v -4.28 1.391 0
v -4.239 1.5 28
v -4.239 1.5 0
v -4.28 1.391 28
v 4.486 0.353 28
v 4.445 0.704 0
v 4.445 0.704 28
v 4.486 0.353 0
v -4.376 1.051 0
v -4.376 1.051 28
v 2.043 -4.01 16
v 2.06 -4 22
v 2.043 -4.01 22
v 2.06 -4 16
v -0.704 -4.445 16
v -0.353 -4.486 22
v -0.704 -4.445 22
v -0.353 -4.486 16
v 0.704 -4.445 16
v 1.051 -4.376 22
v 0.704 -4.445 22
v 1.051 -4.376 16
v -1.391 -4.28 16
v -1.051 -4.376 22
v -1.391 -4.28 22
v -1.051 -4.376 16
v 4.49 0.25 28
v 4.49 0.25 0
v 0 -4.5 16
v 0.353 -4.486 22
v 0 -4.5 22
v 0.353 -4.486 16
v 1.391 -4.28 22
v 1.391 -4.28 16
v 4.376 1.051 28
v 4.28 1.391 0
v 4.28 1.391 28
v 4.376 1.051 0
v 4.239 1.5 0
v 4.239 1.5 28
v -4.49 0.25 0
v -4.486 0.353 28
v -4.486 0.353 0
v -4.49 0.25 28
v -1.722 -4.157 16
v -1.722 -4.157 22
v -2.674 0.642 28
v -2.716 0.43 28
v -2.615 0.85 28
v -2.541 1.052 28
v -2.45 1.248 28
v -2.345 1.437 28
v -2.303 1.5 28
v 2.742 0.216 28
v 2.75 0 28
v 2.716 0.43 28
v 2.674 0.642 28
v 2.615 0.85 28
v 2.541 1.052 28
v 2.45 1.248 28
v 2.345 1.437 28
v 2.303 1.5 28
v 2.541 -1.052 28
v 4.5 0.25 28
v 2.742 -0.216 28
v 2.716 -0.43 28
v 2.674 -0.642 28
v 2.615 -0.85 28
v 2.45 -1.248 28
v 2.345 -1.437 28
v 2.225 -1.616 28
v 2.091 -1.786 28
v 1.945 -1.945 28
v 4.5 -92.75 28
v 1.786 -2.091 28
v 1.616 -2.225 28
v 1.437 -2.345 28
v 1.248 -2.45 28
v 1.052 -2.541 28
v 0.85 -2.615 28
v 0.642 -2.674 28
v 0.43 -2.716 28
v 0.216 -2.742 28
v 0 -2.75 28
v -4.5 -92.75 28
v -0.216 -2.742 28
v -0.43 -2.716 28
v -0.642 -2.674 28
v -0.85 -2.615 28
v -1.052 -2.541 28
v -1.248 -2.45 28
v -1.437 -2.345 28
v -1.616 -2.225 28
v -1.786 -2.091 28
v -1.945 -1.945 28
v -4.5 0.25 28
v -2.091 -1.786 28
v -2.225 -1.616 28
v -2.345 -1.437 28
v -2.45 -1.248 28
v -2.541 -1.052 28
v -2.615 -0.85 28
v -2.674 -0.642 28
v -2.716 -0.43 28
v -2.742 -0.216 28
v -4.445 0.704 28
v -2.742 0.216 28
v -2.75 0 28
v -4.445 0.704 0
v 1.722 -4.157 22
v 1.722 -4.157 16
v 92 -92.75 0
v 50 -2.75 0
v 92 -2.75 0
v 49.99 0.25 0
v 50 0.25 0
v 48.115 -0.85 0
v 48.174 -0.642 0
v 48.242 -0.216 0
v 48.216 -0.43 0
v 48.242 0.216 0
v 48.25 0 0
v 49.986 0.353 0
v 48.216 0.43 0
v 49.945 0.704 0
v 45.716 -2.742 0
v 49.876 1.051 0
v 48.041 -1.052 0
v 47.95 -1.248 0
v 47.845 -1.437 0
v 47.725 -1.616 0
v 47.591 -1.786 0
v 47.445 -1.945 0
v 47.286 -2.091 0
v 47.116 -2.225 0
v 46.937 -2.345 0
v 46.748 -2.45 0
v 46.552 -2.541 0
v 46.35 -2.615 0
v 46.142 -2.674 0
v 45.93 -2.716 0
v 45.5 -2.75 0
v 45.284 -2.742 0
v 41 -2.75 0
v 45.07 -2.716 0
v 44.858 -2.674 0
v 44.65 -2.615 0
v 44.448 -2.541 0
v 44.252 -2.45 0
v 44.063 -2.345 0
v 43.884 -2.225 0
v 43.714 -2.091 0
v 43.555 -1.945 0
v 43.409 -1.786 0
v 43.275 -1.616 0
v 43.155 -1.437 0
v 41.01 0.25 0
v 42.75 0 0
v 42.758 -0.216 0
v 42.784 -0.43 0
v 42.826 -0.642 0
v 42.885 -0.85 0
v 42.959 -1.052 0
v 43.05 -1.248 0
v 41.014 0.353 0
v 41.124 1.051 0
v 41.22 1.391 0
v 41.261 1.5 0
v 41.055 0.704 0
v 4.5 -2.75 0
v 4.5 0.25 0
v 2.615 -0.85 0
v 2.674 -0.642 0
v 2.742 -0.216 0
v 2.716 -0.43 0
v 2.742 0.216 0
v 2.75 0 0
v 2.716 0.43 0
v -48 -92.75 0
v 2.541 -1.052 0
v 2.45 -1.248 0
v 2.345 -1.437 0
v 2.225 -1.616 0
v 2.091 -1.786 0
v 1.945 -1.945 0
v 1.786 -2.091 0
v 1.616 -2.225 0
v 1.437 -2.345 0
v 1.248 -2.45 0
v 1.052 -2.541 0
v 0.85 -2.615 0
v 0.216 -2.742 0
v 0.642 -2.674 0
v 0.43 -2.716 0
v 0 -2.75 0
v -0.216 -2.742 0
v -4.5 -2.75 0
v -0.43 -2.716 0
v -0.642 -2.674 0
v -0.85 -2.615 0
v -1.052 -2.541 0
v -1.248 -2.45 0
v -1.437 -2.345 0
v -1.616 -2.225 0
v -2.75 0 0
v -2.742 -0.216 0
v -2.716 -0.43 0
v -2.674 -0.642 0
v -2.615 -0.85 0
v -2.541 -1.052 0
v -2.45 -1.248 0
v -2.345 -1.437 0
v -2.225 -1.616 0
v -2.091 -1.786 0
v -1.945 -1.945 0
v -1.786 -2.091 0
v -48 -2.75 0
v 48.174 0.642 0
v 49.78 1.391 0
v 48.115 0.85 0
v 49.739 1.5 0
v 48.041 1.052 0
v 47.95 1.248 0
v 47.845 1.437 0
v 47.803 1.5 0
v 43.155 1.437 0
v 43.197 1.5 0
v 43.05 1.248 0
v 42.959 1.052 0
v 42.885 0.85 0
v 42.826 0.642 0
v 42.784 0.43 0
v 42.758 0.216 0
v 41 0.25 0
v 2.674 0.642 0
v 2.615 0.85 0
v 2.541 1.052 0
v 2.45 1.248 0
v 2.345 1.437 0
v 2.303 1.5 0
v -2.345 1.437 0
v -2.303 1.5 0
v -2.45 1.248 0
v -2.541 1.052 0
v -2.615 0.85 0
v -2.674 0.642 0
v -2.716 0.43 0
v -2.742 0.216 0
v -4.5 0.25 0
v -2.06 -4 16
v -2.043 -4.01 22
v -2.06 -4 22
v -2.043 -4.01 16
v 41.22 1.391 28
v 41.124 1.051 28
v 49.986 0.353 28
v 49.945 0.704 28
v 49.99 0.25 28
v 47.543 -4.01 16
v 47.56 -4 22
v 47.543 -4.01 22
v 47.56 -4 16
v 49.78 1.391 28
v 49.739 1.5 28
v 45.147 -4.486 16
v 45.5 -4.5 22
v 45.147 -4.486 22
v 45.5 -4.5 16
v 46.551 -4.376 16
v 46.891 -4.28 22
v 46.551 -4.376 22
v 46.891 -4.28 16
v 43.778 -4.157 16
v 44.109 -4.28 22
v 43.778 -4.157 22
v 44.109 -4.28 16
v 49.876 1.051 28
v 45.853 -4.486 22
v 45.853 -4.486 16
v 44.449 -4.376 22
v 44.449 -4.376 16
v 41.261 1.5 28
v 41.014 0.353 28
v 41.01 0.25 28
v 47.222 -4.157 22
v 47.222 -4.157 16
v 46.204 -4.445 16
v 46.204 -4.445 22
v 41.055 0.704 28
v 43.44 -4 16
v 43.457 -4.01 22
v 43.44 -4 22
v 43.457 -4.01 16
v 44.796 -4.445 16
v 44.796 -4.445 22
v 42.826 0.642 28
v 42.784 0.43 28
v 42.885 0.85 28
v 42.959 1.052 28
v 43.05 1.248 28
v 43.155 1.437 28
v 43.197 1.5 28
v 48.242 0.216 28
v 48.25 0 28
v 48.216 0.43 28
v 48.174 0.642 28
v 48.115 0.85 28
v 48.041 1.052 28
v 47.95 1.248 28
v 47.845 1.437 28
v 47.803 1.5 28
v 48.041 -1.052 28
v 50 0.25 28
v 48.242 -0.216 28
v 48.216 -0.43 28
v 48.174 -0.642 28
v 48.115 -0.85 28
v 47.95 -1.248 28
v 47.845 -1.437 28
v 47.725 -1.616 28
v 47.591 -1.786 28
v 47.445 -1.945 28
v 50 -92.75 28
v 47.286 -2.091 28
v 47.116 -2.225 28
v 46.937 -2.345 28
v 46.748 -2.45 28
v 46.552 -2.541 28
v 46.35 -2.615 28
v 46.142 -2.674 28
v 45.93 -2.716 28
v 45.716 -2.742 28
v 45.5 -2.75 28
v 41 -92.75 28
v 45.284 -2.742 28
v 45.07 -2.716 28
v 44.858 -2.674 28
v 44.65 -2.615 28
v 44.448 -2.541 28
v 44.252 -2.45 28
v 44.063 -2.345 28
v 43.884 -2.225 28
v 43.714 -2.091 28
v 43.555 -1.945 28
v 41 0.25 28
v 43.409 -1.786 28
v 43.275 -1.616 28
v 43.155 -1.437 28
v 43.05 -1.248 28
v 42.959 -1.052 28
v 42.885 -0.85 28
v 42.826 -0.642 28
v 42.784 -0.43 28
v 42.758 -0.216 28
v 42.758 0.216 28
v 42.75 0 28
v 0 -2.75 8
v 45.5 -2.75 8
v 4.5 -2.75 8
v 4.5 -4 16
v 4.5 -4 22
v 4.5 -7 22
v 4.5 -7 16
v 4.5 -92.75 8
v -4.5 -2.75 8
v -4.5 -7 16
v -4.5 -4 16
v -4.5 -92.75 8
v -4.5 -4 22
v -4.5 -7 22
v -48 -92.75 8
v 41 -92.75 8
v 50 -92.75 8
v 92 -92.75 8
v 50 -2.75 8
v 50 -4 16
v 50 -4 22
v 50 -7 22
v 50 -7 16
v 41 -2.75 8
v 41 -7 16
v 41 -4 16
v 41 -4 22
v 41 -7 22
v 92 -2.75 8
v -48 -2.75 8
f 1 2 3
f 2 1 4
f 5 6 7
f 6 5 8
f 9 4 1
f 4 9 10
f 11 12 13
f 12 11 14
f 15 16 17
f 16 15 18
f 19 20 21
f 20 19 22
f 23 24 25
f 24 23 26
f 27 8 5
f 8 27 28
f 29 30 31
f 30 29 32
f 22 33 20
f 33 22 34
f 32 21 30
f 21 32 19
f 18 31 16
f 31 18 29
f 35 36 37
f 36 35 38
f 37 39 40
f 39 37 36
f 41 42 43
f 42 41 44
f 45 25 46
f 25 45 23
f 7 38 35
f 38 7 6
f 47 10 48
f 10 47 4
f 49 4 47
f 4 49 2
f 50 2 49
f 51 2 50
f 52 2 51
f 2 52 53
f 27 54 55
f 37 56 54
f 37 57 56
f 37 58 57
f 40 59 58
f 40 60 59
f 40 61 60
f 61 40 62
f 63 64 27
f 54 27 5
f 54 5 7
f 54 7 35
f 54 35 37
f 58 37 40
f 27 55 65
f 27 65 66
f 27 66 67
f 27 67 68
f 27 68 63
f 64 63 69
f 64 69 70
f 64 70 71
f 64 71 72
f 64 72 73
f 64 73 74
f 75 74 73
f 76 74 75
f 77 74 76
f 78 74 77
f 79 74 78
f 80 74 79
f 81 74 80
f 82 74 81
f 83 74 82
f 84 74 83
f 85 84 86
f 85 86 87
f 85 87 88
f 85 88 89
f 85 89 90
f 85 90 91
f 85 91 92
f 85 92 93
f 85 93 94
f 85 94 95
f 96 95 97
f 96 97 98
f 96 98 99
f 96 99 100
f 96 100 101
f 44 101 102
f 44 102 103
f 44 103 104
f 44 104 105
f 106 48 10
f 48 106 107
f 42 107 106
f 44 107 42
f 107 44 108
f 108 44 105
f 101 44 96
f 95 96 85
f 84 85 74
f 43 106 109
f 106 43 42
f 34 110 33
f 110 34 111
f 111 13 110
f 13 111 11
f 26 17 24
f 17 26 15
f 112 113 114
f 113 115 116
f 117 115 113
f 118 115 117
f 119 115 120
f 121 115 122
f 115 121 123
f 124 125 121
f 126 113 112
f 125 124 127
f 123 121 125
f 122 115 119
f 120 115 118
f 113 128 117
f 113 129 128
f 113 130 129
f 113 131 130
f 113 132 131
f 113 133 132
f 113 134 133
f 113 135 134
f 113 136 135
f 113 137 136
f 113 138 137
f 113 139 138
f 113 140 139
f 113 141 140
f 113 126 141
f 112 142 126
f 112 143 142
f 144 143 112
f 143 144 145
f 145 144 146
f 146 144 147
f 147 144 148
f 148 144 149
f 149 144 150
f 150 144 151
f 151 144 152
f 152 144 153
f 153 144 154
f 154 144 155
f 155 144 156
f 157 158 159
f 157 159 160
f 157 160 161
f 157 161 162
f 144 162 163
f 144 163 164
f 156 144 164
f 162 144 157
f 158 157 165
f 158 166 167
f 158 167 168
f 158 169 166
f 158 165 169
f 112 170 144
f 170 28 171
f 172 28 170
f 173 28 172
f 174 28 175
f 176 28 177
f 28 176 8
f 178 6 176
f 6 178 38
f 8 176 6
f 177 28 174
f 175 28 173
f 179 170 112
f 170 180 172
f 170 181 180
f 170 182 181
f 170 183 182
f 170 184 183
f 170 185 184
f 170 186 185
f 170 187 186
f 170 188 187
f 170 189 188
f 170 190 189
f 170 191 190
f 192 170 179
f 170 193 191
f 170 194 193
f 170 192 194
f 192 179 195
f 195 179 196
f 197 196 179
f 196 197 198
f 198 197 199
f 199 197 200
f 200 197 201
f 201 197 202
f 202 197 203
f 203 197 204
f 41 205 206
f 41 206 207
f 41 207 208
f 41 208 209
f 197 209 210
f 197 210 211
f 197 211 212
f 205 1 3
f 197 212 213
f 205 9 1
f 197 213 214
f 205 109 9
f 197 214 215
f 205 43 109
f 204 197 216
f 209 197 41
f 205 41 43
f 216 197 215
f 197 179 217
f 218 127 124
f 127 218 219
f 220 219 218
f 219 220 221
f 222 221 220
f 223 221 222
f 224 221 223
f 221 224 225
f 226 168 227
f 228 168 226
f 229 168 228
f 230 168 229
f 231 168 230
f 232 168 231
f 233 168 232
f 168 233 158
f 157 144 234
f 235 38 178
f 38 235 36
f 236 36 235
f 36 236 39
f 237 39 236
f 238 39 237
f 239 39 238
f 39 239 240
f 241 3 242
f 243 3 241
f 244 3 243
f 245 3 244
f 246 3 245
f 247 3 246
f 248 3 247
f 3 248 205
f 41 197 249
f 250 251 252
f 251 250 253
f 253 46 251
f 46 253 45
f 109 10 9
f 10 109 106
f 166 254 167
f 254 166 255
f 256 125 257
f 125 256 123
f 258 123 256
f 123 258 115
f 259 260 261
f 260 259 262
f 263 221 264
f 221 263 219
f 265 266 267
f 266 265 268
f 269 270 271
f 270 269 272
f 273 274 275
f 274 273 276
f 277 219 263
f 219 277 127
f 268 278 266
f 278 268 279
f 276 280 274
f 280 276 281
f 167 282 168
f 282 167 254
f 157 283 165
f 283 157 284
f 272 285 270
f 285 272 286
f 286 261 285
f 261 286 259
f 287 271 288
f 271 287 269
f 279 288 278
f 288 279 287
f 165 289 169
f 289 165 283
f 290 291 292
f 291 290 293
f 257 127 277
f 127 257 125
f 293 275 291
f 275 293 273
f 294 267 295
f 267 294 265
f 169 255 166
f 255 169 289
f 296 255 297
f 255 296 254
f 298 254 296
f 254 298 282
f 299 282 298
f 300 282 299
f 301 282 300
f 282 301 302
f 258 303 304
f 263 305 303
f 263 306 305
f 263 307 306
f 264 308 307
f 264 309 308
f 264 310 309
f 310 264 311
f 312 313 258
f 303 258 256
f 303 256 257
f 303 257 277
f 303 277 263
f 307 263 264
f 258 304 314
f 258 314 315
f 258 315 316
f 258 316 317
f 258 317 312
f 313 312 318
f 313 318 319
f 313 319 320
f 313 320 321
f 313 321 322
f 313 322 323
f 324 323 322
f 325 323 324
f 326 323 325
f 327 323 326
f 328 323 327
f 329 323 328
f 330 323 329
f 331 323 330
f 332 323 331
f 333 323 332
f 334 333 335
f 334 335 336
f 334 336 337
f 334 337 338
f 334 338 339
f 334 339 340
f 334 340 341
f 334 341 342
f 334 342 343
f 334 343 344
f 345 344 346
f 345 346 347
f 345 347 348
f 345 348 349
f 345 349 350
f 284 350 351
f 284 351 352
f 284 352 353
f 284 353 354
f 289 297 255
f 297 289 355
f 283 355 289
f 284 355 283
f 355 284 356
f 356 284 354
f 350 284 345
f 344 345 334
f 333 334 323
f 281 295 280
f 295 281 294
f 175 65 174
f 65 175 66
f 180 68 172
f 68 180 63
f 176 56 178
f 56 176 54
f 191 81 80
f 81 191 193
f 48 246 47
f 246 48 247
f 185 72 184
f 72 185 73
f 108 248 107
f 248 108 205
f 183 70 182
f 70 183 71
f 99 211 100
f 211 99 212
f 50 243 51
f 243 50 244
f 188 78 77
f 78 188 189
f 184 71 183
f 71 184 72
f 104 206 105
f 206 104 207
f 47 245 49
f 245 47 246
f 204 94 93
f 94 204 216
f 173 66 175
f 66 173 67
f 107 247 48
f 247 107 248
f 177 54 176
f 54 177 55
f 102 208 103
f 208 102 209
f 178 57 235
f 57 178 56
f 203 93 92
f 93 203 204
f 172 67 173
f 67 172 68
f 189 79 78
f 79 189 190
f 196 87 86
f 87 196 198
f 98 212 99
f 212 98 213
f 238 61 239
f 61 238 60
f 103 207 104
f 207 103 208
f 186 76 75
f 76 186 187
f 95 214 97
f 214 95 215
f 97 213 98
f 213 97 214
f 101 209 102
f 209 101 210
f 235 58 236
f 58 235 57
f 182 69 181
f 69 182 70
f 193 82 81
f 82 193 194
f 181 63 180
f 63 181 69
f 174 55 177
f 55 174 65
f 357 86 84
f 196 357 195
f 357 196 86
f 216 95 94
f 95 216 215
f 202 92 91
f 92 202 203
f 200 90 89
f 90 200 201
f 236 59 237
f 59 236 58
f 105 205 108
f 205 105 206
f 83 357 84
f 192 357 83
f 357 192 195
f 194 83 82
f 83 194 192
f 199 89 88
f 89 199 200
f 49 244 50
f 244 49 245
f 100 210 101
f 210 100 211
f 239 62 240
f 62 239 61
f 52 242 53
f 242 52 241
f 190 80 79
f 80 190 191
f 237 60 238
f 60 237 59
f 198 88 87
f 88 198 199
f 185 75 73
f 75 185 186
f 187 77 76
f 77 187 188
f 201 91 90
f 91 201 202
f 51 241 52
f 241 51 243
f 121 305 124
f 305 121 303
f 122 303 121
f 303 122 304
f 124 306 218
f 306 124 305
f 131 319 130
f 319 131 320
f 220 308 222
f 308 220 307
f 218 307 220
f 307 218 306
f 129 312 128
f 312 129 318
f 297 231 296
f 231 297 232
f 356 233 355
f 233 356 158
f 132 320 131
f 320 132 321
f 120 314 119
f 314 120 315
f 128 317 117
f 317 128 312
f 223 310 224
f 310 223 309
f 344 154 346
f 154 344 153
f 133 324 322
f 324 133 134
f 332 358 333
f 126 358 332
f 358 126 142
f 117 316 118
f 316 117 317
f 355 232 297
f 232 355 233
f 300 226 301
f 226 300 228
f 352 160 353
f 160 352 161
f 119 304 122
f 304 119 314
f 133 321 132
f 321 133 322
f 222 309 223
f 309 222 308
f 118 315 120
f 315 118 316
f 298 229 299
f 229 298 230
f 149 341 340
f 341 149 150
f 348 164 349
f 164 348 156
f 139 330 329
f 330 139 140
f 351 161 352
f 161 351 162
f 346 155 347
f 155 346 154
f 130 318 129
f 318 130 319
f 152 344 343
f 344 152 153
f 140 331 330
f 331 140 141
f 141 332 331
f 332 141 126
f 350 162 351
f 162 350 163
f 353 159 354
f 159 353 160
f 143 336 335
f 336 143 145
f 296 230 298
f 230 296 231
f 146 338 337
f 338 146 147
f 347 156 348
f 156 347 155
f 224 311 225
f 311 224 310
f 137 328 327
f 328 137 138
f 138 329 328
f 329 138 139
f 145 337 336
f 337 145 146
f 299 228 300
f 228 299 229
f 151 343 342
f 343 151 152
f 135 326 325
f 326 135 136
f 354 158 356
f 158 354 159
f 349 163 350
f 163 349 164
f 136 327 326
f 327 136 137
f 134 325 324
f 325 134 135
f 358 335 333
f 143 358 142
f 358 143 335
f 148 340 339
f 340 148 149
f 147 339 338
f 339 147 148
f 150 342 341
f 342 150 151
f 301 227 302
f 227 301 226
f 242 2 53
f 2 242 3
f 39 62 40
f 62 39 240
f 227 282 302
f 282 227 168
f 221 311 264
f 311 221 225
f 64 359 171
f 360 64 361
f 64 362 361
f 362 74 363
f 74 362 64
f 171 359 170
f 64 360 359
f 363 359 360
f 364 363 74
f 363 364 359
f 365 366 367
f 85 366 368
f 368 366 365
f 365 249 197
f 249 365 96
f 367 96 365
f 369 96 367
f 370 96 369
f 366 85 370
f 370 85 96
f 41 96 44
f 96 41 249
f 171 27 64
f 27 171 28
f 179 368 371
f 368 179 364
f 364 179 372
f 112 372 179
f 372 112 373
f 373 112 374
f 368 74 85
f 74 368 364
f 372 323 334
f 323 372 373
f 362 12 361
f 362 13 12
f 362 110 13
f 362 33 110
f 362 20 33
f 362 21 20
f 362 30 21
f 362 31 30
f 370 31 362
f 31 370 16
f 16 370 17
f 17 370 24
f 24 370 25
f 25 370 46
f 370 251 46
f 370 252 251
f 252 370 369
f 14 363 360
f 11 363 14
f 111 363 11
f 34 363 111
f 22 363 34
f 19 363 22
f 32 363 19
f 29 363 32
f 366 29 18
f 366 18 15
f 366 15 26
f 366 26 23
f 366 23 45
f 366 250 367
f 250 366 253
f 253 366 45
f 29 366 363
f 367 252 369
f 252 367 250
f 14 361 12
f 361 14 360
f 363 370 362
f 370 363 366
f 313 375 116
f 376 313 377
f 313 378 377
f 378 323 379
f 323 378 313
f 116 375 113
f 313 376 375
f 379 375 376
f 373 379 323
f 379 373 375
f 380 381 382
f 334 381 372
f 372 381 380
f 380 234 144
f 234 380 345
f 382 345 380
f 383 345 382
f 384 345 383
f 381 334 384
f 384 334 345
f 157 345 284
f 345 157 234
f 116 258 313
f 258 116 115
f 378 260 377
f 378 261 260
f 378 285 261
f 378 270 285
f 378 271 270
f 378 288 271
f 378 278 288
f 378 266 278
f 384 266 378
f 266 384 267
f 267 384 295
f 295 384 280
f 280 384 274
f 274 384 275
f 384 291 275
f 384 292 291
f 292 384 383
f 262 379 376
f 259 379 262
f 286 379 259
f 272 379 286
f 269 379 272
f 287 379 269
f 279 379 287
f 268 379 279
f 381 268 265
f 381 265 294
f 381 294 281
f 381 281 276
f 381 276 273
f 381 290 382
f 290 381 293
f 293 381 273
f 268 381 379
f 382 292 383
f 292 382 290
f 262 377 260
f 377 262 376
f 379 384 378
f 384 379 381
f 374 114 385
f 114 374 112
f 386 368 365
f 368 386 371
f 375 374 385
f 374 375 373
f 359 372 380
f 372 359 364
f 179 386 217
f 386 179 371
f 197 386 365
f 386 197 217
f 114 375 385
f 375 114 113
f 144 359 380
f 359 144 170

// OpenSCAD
$fn = 80;

difference() {
    holder();
    translate([0, 0, -1]) rods();
    translate([-20, 1.5, -1]) cube([100, 10, 30]);
}

translate([-48, -92.75, 0]) shelf();

supports();

module supports() {
    difference() {
        translate([-4.5, -92.75, 0]) cube([9, 93, 28]);
        translate([0, 0, -1]) rods();
        translate([-7, -7, 16]) cube([20, 3, 6]); 
    }
    difference() {
        translate([40 + 1, -92.75, 0]) cube([9, 93, 28]);
        translate([0, 0, -1]) rods();
        translate([40 + -7, -7, 16]) cube([20, 3, 6]); 
    }
}

module shelf() {
    cube([140, 90, 8]);
}

module holder() {
    cylinder(d = 9, h = 28);
    translate([40 + 5.5, 0, 0]) cylinder(d = 9, h = 28);
}

module rods() {
    cylinder(d = 5.5, h = 30);
    translate([40 + 5.5, 0, 0]) cylinder(d = 5.5, h = 30);
}
//translate([2.75,0,0]) #cube([40,1,1]);
